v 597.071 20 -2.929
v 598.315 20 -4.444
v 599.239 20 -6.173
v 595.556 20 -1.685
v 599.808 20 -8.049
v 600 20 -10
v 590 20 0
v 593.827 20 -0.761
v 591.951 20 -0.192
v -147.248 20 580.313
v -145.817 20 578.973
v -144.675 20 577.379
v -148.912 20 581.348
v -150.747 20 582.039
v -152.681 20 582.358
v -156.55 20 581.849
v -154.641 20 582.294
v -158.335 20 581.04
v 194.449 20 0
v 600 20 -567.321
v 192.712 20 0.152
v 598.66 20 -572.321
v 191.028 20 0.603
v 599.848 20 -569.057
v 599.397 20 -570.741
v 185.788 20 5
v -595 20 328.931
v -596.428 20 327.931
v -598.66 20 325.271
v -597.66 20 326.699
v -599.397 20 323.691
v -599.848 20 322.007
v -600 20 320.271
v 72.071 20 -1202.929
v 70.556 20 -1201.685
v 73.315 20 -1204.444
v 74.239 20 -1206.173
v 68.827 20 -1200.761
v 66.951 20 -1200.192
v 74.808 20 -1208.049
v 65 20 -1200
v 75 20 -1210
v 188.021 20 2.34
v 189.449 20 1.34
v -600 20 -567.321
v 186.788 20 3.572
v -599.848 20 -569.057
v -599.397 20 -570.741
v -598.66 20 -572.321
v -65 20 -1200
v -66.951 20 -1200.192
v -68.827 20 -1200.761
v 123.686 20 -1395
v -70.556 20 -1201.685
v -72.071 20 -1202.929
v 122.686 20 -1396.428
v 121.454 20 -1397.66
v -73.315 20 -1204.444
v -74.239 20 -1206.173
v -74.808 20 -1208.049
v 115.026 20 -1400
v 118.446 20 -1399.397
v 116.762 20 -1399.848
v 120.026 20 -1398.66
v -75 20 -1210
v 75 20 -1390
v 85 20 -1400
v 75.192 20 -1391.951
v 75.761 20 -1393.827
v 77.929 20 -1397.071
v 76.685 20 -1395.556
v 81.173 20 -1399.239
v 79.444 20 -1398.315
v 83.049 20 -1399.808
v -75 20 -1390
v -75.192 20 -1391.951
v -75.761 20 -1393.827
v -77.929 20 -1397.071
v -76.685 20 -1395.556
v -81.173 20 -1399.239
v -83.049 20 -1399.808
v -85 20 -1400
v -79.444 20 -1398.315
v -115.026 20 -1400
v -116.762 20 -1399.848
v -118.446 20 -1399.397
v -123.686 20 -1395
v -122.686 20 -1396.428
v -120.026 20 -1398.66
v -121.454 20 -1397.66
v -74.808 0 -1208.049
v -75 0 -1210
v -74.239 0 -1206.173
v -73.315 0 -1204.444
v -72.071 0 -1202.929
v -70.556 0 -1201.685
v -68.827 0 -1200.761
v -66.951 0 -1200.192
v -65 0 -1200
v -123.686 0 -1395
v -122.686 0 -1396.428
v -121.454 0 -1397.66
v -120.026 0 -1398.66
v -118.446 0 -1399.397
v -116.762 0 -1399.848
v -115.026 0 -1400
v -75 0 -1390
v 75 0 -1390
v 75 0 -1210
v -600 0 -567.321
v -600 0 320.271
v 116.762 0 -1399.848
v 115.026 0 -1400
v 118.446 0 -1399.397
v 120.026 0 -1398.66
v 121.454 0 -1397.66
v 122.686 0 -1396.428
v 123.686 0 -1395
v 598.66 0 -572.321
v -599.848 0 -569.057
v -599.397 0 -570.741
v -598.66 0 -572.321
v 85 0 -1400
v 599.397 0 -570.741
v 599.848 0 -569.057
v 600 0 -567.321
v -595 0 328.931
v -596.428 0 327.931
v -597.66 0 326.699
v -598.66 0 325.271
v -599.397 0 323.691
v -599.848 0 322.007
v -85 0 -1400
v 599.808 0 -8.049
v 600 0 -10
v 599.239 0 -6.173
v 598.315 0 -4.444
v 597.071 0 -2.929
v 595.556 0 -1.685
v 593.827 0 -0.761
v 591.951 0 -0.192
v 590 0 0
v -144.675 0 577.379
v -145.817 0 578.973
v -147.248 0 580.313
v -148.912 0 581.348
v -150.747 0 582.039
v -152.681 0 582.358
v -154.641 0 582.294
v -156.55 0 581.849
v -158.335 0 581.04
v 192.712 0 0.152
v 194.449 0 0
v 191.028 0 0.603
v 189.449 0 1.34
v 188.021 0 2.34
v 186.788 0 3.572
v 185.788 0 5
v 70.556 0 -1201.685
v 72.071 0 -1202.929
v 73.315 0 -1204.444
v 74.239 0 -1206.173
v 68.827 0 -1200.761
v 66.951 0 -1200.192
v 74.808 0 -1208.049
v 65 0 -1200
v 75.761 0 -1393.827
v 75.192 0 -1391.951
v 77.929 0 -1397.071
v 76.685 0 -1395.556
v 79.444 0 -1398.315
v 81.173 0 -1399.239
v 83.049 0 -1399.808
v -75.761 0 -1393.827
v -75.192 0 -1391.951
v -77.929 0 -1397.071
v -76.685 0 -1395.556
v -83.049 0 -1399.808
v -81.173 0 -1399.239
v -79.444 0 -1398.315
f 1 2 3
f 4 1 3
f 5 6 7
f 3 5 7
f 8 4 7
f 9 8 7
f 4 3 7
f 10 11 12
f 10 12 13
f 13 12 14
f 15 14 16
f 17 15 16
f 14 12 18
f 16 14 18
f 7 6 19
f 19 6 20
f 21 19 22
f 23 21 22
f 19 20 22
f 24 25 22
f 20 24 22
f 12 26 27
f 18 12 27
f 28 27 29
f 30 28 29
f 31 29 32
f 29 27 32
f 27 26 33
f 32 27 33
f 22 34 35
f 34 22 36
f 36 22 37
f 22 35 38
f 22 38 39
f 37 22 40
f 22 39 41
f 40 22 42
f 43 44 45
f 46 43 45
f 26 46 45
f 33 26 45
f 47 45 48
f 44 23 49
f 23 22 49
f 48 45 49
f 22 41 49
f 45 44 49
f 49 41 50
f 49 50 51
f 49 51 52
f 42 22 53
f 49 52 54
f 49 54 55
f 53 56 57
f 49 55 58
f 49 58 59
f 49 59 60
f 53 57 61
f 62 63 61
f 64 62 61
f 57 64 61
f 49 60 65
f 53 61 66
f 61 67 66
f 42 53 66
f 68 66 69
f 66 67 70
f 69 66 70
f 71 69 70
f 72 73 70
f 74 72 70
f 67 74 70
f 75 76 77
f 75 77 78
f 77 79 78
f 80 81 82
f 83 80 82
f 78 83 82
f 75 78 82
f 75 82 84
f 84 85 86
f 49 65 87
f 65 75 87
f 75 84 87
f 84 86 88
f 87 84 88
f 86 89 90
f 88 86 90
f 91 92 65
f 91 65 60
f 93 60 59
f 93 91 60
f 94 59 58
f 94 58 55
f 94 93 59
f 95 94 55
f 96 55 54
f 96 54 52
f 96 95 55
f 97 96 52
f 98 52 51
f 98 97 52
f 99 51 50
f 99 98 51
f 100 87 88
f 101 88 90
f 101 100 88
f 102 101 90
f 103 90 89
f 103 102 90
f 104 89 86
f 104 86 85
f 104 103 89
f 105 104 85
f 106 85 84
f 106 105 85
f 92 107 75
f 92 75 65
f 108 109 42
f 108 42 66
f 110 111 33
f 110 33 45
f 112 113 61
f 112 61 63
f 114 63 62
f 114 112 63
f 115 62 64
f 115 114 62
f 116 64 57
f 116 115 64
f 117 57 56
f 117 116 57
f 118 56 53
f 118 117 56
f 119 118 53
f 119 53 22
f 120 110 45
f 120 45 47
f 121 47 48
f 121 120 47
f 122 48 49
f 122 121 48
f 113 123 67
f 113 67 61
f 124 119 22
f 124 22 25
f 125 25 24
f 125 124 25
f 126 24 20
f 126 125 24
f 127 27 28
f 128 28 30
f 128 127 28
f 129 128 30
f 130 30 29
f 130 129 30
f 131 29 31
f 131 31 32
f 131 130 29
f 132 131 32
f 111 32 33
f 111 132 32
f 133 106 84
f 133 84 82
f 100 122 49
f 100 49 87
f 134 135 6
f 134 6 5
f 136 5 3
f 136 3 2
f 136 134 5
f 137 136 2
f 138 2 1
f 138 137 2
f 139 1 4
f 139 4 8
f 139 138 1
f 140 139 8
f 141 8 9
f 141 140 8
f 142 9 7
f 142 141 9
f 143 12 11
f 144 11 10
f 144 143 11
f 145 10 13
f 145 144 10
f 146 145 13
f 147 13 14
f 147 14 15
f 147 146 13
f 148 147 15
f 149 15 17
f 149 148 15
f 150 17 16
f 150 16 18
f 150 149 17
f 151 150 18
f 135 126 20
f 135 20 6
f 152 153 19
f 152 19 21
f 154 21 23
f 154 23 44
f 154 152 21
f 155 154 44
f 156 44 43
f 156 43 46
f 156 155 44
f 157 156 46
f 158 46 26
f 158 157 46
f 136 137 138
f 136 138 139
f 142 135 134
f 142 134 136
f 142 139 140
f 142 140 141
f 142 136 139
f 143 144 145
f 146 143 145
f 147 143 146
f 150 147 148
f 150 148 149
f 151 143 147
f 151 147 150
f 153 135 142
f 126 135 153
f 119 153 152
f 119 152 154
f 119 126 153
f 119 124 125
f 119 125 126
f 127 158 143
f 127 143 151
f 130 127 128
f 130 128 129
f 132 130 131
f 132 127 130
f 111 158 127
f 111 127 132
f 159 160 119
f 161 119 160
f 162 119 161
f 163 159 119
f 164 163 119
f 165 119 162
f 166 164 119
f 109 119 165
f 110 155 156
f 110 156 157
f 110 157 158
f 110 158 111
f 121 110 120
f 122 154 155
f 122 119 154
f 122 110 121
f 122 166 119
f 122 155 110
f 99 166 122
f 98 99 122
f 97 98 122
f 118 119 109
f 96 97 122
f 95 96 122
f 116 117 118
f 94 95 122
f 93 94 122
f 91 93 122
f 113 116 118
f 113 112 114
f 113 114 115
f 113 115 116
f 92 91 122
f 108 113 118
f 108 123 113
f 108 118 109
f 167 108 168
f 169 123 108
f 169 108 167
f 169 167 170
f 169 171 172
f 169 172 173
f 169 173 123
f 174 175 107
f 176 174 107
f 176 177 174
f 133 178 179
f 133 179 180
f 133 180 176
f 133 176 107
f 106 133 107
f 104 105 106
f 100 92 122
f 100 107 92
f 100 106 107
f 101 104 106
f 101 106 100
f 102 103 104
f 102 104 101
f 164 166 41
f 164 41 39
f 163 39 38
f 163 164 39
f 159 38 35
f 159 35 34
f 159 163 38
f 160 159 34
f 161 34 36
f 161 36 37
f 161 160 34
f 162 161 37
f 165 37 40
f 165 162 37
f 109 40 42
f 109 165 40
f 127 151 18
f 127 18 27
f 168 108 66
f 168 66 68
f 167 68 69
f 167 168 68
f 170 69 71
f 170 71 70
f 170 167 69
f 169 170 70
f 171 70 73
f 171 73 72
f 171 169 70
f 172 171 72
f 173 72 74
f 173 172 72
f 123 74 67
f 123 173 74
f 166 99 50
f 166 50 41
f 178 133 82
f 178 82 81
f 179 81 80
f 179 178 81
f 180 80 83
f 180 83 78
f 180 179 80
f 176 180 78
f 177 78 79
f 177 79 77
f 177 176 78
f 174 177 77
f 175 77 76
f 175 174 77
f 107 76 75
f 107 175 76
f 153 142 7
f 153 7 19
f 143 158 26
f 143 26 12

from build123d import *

# Parameters (mm, degrees)
BOSS_EXTRUDE2_DEPTH = 20


with BuildPart() as part:
    # Sketch1 → Boss-Extrude2 (new body)
    with BuildSketch(Plane(origin=(0, 0, 0), x_dir=(1, 0, 0), z_dir=(0, 1, 0))):
        with BuildLine():
            Line((590, 0), (194.448637287, 0))
            ThreePointArc((194.448637287, 0), (189.448637287, -1.339745962), (185.788383249, -5))
            Line((185.788383249, -5), (-144.675037911, -577.379435493))
            ThreePointArc((-144.675037911, -577.379435493), (-150.747101498, -582.038693755), (-158.335291949, -581.03968953))
            Line((-158.335291949, -581.03968953), (-595, -328.931202792))
            ThreePointArc((-595, -328.931202792), (-598.660254038, -325.270948754), (-600, -320.270948754))
            Line((-600, -320.270948754), (-600, 0))
            Line((-600, 0), (-600, 567.320508076))
            ThreePointArc((-600, 567.320508076), (-599.659258263, 569.908698527), (-598.660254038, 572.320508076))
            Line((-598.660254038, 572.320508076), (-123.686027919, 1395))
            ThreePointArc((-123.686027919, 1395), (-120.025773881, 1398.660254038), (-115.025773881, 1400))
            Line((-115.025773881, 1400), (-85, 1400))
            ThreePointArc((-85, 1400), (-77.928932188, 1397.071067812), (-75, 1390))
            Line((-75, 1390), (-75, 1210))
            ThreePointArc((-75, 1210), (-72.071067812, 1202.928932188), (-65, 1200))
            Line((-65, 1200), (65, 1200))
            ThreePointArc((65, 1200), (72.071067812, 1202.928932188), (75, 1210))
            Line((75, 1210), (75, 1390))
            ThreePointArc((75, 1390), (77.928932188, 1397.071067812), (85, 1400))
            Line((85, 1400), (115.025773881, 1400))
            ThreePointArc((115.025773881, 1400), (120.025773881, 1398.660254038), (123.686027919, 1395))
            Line((123.686027919, 1395), (598.660254038, 572.320508076))
            ThreePointArc((598.660254038, 572.320508076), (599.659258263, 569.908698527), (600, 567.320508076))
            Line((600, 567.320508076), (600, 10))
            ThreePointArc((600, 10), (597.071067812, 2.928932188), (590, 0))
        make_face()
    extrude(amount=BOSS_EXTRUDE2_DEPTH)


solid = part.part
